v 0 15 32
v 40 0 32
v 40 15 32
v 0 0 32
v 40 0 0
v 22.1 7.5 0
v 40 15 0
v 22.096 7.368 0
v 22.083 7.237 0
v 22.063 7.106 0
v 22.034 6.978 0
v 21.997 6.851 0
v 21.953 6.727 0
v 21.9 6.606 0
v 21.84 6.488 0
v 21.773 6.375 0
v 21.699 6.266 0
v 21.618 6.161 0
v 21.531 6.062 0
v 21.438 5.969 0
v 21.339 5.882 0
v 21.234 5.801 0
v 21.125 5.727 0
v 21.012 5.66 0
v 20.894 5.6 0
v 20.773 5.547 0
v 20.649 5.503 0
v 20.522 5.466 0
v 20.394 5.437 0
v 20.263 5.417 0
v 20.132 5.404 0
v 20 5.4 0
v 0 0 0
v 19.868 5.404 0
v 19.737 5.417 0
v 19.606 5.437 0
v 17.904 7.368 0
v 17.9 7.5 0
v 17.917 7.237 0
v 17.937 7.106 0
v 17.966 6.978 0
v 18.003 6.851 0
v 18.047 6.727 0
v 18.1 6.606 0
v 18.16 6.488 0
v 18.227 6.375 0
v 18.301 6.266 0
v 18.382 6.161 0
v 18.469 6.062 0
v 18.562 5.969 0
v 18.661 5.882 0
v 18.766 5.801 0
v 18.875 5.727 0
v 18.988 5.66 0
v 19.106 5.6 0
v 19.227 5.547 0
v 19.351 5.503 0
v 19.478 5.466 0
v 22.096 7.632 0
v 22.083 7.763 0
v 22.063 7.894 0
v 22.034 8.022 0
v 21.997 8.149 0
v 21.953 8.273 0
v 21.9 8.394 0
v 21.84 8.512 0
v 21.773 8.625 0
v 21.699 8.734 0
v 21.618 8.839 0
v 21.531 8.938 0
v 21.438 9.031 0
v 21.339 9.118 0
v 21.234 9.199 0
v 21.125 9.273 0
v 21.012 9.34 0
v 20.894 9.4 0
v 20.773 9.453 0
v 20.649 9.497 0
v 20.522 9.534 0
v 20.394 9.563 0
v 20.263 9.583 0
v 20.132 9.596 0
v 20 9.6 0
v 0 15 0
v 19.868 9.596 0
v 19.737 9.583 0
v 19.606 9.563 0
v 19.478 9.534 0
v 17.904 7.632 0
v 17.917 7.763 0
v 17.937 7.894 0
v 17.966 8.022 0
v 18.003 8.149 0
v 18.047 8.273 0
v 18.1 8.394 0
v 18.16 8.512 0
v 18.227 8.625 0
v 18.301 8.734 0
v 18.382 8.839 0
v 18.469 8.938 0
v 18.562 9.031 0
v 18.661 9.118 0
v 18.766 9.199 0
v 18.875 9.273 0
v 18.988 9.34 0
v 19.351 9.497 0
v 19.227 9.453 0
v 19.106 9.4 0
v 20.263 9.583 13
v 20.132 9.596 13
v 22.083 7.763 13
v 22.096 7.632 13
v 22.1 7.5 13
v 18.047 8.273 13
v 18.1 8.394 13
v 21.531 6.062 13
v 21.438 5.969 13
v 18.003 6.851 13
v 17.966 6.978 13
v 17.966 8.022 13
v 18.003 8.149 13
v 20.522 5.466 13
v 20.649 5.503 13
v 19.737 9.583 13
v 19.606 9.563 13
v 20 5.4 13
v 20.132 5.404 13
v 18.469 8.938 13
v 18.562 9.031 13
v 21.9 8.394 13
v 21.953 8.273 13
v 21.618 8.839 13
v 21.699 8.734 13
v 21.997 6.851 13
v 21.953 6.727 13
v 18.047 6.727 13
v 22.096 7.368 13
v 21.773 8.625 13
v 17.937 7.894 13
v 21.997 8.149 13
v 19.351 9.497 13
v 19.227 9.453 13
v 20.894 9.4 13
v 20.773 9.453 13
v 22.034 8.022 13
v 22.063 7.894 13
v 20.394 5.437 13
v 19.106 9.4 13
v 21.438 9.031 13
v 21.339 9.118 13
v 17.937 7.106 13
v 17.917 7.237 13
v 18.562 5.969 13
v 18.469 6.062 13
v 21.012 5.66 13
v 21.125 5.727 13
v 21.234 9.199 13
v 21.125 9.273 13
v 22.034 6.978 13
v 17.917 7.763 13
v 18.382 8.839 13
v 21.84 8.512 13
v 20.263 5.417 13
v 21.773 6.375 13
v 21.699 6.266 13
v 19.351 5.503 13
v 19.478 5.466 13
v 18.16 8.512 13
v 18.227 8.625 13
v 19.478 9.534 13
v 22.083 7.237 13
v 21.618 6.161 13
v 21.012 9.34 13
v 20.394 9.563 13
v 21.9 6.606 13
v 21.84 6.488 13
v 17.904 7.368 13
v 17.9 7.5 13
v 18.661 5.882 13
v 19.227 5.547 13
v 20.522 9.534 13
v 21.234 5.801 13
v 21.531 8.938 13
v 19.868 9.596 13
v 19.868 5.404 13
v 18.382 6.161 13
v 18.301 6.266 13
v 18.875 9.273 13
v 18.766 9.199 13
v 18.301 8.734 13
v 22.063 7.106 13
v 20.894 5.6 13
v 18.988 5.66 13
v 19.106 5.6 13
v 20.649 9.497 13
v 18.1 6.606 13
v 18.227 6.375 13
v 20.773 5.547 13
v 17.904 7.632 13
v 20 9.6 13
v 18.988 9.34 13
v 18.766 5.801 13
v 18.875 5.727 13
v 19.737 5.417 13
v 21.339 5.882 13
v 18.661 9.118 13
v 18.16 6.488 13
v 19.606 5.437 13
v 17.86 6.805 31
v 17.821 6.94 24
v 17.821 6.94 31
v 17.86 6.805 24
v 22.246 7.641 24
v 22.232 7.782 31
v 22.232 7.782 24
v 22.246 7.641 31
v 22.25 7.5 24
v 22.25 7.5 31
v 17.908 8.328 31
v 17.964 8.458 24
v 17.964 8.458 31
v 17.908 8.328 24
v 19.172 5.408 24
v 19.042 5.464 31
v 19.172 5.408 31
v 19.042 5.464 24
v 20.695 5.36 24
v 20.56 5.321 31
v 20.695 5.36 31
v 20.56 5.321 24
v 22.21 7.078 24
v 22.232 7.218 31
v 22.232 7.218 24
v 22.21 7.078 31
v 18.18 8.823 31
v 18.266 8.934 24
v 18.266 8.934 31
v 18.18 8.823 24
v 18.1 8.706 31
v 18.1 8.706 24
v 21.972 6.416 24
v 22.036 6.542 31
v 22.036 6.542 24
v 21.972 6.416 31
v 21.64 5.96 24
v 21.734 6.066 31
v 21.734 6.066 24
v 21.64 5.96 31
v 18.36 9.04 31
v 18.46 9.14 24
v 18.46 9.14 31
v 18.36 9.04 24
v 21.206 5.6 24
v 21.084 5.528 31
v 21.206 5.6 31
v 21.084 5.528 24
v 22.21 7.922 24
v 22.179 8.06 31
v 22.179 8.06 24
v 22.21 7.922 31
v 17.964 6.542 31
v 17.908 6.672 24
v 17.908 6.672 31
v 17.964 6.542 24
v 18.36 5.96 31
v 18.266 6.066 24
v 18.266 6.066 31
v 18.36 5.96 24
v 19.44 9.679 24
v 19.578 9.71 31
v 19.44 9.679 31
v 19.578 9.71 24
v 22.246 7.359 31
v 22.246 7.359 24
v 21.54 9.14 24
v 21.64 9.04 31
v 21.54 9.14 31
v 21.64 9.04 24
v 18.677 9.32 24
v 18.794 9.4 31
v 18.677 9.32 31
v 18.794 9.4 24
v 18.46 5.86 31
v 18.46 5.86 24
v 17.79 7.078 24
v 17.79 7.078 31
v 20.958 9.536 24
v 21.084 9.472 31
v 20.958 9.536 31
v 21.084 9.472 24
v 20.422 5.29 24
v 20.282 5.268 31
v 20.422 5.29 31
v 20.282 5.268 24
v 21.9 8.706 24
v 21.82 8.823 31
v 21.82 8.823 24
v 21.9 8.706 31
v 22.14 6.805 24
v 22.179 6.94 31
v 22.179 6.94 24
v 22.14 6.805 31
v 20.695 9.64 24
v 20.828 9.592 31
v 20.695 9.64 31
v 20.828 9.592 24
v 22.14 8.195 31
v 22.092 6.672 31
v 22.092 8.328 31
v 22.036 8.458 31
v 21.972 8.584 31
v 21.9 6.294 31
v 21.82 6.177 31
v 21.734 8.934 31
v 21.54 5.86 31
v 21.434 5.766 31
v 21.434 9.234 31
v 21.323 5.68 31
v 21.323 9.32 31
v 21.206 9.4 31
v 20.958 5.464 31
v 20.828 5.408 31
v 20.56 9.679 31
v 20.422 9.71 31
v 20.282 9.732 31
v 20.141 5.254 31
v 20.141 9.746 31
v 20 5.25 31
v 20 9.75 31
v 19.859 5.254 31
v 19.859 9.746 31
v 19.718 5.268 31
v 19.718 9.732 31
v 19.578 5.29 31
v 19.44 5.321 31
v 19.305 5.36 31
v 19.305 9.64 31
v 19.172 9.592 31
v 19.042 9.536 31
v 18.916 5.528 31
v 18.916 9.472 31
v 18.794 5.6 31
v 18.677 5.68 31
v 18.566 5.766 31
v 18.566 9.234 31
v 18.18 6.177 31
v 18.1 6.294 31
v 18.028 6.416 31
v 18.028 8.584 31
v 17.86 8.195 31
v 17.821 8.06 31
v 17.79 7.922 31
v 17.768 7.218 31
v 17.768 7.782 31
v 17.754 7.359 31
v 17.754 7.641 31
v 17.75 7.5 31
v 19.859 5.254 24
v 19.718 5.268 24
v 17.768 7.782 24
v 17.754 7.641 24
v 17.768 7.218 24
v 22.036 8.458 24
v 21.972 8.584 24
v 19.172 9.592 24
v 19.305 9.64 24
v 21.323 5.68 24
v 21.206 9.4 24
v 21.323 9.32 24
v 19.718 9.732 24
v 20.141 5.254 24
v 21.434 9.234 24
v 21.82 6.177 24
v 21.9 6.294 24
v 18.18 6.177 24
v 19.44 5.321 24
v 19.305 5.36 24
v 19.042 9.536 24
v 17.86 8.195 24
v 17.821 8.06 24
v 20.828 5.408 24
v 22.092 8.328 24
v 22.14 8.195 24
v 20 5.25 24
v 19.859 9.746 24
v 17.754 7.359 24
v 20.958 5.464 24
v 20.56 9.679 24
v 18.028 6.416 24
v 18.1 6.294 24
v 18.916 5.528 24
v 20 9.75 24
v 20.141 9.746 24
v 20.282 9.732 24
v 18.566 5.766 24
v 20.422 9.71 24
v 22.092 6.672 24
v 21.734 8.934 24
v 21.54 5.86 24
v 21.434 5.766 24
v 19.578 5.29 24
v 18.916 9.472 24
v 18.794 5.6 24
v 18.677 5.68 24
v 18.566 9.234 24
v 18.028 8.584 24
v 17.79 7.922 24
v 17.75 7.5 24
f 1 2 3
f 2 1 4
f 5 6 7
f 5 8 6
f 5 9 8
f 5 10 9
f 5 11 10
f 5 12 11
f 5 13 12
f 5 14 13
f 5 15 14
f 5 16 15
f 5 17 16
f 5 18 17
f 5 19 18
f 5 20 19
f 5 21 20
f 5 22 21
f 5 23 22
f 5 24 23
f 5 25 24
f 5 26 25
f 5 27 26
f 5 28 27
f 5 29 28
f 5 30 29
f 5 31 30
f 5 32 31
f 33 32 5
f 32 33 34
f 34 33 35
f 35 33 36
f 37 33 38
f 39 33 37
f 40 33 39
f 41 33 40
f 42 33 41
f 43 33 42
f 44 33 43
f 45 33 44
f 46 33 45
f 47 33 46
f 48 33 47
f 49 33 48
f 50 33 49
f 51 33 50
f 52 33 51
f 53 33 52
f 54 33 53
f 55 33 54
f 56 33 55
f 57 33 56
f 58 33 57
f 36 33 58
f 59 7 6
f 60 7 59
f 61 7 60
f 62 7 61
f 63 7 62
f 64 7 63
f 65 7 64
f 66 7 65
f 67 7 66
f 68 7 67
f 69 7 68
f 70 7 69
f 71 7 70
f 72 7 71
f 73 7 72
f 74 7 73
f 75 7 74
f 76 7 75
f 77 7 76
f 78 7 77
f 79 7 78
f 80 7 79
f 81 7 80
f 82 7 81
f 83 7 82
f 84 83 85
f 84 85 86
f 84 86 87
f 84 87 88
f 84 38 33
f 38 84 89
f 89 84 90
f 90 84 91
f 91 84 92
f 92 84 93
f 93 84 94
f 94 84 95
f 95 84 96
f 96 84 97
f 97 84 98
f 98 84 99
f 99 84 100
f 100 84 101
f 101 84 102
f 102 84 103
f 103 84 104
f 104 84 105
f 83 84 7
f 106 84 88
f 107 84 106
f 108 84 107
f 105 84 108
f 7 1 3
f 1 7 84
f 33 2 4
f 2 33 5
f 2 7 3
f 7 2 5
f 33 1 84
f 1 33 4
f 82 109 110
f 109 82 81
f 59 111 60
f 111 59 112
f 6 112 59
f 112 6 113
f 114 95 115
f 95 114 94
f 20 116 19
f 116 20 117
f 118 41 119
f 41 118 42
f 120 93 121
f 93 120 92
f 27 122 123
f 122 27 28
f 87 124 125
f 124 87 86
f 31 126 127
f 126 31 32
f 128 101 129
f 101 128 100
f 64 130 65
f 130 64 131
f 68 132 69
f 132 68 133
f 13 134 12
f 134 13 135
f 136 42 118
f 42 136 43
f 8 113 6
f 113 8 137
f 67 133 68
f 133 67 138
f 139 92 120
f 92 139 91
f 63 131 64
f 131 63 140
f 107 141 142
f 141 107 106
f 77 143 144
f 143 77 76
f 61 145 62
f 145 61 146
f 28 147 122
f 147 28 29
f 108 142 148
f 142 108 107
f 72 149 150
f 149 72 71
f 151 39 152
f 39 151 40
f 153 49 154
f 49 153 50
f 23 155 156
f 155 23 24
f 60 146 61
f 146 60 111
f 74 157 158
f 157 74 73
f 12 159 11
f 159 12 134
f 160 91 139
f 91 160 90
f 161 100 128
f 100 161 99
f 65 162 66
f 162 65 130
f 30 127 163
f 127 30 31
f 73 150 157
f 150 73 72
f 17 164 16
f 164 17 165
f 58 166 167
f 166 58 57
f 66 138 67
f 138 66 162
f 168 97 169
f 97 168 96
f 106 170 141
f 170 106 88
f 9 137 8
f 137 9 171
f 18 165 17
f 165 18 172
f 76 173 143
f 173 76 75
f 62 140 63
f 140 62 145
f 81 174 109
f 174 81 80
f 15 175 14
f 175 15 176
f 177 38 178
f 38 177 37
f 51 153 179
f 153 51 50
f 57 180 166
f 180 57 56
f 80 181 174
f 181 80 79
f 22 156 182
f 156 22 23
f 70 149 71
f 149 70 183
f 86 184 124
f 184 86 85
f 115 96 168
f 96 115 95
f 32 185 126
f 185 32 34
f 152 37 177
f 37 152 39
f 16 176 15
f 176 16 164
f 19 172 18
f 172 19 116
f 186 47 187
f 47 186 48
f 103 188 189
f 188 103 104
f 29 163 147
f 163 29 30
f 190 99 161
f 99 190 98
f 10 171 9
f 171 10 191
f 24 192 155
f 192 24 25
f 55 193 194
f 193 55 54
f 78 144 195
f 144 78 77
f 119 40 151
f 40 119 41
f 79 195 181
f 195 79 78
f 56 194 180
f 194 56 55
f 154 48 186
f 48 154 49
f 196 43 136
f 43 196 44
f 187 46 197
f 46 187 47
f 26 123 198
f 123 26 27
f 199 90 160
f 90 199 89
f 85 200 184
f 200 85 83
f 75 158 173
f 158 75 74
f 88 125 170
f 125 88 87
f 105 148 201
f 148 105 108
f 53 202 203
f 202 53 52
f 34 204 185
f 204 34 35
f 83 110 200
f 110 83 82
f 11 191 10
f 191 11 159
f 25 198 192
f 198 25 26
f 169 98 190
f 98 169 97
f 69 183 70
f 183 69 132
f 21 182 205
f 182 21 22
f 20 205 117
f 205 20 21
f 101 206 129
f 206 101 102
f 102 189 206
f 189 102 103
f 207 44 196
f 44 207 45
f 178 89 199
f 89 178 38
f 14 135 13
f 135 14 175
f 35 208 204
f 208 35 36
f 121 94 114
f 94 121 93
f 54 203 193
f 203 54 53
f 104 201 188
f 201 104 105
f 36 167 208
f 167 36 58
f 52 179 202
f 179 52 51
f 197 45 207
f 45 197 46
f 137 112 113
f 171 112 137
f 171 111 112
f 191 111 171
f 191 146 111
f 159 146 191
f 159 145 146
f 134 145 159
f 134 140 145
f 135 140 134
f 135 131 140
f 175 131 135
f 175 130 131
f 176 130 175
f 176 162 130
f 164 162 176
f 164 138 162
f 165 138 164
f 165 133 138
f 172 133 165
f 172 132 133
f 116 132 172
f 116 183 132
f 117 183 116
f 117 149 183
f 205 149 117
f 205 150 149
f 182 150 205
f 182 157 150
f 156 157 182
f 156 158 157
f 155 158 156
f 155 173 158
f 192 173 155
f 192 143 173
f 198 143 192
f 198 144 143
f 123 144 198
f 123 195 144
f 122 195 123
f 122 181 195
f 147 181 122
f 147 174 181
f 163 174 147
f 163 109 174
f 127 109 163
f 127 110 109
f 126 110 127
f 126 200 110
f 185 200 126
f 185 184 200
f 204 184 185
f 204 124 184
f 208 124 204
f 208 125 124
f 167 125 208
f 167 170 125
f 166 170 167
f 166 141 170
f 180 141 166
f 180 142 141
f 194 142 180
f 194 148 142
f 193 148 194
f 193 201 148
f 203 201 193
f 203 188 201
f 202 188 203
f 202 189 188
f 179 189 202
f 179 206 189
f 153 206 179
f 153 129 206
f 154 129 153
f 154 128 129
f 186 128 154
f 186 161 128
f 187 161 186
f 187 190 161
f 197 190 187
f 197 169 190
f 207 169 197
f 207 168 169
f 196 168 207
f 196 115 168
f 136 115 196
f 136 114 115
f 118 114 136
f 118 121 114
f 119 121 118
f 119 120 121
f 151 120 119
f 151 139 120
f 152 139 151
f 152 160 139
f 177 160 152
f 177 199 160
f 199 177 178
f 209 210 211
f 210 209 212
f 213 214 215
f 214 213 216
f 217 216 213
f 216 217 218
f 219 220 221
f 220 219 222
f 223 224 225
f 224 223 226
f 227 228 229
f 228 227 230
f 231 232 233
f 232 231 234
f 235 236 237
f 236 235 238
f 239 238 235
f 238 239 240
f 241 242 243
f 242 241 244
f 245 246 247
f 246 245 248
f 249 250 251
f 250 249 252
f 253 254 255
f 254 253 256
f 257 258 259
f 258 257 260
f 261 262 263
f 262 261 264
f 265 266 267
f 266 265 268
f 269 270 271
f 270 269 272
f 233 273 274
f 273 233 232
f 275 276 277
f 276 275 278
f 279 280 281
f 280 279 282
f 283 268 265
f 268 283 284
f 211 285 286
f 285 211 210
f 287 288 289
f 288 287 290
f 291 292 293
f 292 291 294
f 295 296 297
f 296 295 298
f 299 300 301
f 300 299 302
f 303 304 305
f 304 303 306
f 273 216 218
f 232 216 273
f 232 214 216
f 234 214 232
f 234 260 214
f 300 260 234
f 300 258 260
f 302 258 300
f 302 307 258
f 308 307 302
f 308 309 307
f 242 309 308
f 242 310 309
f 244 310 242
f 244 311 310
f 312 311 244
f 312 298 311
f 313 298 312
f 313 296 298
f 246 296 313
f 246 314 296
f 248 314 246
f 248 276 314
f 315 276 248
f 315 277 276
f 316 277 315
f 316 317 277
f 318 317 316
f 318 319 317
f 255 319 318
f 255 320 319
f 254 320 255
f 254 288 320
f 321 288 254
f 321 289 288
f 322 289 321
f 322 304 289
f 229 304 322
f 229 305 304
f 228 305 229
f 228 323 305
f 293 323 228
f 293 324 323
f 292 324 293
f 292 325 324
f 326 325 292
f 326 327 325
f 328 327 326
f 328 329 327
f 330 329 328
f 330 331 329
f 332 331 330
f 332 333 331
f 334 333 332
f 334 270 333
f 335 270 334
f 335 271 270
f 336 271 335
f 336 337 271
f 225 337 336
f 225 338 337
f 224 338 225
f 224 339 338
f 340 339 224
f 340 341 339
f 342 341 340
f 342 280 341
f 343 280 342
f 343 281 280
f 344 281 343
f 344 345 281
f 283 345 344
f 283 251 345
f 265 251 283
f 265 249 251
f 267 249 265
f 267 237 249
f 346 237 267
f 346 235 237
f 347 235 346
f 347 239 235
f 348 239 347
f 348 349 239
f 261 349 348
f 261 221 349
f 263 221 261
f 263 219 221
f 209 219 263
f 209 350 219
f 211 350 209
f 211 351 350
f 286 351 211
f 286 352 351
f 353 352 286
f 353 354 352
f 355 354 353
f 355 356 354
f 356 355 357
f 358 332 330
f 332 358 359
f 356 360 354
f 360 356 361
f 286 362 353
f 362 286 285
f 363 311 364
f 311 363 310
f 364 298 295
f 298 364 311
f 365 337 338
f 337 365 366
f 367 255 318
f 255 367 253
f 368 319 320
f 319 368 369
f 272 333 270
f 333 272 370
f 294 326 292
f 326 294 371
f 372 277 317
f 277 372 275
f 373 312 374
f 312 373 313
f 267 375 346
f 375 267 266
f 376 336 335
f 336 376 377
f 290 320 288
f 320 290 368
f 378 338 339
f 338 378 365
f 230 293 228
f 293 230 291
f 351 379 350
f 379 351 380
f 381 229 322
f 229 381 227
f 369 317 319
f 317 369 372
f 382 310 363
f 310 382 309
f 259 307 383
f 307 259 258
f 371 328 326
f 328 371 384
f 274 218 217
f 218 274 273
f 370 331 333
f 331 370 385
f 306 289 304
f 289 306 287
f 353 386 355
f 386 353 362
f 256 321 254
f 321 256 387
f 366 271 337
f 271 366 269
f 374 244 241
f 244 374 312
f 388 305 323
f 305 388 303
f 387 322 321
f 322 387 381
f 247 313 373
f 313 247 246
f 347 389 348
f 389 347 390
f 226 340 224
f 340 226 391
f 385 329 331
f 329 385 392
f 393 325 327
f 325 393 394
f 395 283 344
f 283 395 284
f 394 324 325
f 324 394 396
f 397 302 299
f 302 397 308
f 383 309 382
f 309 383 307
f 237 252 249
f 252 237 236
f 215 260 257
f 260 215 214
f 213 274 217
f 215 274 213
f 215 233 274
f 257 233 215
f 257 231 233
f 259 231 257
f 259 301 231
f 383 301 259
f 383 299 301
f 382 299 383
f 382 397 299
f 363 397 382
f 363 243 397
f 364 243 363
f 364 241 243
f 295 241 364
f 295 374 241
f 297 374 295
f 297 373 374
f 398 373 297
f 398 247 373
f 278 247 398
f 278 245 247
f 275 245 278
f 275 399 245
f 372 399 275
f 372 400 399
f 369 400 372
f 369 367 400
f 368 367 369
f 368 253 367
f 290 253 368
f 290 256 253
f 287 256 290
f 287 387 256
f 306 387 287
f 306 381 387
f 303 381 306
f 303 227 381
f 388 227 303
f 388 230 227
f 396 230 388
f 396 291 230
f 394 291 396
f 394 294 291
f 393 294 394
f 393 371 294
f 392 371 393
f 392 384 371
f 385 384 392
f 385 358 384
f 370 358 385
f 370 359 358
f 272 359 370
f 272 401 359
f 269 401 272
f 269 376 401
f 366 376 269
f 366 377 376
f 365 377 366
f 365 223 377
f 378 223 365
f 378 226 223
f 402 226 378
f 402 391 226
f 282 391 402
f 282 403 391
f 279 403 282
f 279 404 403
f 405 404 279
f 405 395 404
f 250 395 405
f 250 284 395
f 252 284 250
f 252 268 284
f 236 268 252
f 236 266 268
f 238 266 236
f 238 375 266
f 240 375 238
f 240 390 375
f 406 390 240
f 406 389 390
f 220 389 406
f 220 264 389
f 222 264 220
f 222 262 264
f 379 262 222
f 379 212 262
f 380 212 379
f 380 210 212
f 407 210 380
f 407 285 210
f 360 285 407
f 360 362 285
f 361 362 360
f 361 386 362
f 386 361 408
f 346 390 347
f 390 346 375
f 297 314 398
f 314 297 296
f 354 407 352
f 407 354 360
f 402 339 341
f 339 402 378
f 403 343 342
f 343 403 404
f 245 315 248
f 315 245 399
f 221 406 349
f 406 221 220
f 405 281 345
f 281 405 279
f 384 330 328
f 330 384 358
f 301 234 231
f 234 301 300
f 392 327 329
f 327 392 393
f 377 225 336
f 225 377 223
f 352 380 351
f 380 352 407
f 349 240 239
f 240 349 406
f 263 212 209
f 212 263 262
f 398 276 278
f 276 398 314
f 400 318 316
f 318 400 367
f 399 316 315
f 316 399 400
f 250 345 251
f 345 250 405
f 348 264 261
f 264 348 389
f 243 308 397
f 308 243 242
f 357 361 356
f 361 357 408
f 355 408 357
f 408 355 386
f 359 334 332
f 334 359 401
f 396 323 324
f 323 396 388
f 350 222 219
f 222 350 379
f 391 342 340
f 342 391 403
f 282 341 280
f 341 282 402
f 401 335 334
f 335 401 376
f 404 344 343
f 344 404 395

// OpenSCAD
// ====================================================================
// Entretoise verticale Mean Well LRS-600 pour Ender 5 Plus
// ====================================================================
// Auteur: RMonnot
// Licence: MIT
// ====================================================================
// Cette entretoise corrige l'espacement vertical entre l'alimentation
// Mean Well (18mm) et le châssis Ender 5 Plus (25mm)
// ====================================================================

// PARAMÈTRES PRINCIPAUX
espacement_meanwell = 18;          // Espacement vertical Mean Well
espacement_chassis = 25;           // Espacement vertical châssis
difference_espacement = espacement_chassis - espacement_meanwell; // 7mm

// Dimensions de l'entretoise
longueur_entretoise = 40;          // Longueur de l'entretoise
largeur_entretoise = 15;           // Largeur de l'entretoise
epaisseur_entretoise = 5;          // Épaisseur de l'entretoise
hauteur_totale = espacement_chassis + 7; // Hauteur totale avec marges

// Trous
diametre_trou = 4.2;               // Diamètre trou M4 avec jeu
diametre_trou_partage = 4.5;       // Trou 3 (partagé) légèrement plus large

// Nervures
ajouter_nervures = true;
epaisseur_nervure = 3;
hauteur_nervure = 3;

// PARAMÈTRES D'IMPRESSION
$fn = 100;

// ====================================================================
// MODULES
// ====================================================================

module corps_entretoise() {
    cube([longueur_entretoise, largeur_entretoise, hauteur_totale]);
}

module trous_fixation() {
    // Centrage horizontal des trous
    offset_x = longueur_entretoise / 2;
    offset_y = largeur_entretoise / 2;
    
    // Trou 1 (Haut) - CHÂSSIS uniquement
    translate([offset_x, offset_y, -1])
    cylinder(h = epaisseur_entretoise + 2, d = diametre_trou);
    
    // Trou 2 (Milieu) - ALIMENTATION uniquement
    translate([offset_x, offset_y, difference_espacement - 1])
    cylinder(h = epaisseur_entretoise + 2, d = diametre_trou);
    
    // Trou 3 (Bas) - CHÂSSIS + ALIMENTATION (partagé)
    translate([offset_x, offset_y, espacement_chassis - 1])
    cylinder(h = epaisseur_entretoise + 2, d = diametre_trou_partage);
}

module nervures() {
    if (ajouter_nervures) {
        // Nervure verticale centrale
        translate([(longueur_entretoise - epaisseur_nervure) / 2, 0, 0])
        cube([epaisseur_nervure, largeur_entretoise, hauteur_totale]);
        
        // Nervure horizontale centrale
        translate([0, (largeur_entretoise - epaisseur_nervure) / 2, 0])
        cube([longueur_entretoise, epaisseur_nervure, hauteur_totale]);
    }
}

// ====================================================================
// ASSEMBLAGE FINAL
// ====================================================================

module entretoise_verticale() {
    difference() {
        union() {
            corps_entretoise();
            nervures();
        }
        trous_fixation();
    }
}

entretoise_verticale();

// ====================================================================
// NOTES D'INSTALLATION
// ====================================================================
// Imprimez 2 entretoises (gauche + droite)
// 
// Installation:
// 1. Trou 3 (bas): Vis M4 x 20mm traverse entretoise + alimentation
// 2. Trou 2 (milieu): Vis M4 x 10mm dans alimentation seule
// 3. Trou 1 (haut): Vis M4 x 10mm dans châssis seul
//
// Espacement résultant:
// - Mean Well: Trou 2 → Trou 3 = 18mm ✓
// - Châssis: Trou 1 → Trou 3 = 25mm ✓
// ====================================================================
